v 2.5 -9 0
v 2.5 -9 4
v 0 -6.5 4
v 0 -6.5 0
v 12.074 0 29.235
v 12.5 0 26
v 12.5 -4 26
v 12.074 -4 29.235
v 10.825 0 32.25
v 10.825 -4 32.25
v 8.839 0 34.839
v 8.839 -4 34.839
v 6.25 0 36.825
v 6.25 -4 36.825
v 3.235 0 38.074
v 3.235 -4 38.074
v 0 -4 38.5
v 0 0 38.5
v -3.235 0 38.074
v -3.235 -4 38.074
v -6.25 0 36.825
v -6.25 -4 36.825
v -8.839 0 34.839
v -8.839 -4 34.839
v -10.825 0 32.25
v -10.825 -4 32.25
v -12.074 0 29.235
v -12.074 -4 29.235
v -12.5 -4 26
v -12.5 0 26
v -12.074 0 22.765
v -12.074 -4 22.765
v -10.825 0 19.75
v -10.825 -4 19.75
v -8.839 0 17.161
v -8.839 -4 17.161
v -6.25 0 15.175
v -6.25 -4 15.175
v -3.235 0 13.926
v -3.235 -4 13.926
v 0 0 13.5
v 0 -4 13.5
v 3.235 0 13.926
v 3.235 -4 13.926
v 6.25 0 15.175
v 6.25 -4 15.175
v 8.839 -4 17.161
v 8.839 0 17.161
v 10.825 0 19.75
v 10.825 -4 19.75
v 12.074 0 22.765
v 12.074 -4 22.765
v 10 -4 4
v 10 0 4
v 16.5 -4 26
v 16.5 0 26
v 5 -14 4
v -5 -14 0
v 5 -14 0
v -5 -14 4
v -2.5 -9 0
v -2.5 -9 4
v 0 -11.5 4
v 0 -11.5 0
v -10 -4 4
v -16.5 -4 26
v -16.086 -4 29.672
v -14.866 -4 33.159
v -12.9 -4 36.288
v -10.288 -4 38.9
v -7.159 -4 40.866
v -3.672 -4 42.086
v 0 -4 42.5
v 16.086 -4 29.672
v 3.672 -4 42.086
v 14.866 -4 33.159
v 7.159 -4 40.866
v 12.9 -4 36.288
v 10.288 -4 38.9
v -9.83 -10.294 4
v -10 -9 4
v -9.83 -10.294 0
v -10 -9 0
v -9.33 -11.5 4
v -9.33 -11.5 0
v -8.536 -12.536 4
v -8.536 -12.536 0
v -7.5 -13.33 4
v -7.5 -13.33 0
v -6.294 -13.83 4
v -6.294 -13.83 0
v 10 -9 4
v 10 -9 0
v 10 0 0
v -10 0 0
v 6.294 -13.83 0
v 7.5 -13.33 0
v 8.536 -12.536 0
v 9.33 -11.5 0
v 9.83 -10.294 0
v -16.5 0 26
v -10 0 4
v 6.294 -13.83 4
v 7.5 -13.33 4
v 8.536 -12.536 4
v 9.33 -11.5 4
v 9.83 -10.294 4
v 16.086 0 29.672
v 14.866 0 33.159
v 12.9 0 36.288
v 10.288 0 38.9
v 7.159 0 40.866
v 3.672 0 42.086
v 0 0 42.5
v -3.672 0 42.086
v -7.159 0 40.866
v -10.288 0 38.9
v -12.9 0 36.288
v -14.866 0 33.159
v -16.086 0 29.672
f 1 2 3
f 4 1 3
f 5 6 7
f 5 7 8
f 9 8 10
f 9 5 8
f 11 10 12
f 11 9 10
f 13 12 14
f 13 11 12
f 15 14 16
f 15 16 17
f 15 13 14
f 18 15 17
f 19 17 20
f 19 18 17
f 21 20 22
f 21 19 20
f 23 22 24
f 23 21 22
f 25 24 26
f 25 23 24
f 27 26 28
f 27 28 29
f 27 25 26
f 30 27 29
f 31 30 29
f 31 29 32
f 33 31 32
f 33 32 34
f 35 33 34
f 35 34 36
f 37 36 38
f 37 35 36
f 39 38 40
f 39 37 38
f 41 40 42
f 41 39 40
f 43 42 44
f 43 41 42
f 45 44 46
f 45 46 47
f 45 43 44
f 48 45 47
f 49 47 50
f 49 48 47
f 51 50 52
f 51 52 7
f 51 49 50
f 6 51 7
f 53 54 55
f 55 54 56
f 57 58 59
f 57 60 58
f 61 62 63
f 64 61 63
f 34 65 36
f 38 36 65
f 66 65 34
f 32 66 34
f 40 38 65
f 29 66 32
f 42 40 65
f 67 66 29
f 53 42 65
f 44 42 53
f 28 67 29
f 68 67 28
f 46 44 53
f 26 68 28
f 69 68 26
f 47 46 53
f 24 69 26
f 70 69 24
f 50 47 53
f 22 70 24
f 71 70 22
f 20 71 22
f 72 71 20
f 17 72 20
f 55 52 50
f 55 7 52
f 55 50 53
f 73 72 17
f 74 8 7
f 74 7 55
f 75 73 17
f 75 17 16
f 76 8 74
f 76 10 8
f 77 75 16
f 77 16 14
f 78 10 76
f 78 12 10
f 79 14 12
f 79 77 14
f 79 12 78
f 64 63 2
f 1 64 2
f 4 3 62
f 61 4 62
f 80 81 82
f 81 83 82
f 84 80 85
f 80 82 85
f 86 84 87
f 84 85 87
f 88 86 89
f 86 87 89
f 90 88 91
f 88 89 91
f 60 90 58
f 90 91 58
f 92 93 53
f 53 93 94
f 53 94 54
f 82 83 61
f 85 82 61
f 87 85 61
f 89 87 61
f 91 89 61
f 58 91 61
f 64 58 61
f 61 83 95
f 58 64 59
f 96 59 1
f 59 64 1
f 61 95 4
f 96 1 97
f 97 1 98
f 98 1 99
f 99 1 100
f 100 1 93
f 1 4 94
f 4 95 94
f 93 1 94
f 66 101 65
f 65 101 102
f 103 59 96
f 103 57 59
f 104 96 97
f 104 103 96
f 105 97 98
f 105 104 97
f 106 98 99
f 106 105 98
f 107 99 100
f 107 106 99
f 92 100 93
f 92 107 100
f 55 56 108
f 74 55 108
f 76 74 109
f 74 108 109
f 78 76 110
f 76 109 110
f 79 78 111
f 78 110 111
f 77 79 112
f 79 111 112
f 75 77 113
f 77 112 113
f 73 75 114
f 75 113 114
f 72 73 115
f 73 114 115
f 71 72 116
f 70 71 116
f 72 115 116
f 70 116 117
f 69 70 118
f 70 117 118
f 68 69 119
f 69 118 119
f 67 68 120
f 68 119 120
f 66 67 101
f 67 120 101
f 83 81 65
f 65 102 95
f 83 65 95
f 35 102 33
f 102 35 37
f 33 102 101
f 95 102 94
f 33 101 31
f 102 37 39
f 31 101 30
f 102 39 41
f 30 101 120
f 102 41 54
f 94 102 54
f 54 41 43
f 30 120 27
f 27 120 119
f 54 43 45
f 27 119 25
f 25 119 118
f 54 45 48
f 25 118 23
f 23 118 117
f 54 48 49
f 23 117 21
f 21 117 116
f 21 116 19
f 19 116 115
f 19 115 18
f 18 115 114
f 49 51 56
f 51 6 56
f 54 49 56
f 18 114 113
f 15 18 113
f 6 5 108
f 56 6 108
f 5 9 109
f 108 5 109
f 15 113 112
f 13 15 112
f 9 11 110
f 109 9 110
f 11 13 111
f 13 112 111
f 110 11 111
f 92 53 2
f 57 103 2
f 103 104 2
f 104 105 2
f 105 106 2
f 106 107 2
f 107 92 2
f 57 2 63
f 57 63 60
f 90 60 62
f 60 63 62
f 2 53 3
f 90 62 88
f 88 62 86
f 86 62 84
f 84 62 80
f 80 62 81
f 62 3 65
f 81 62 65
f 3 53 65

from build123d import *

# Parameters (mm, degrees)
F1_DEPTH = 14
F0_R     = 12.5
F2_DEPTH = 4
F3_R     = 5
F5_DEPTH = 4


with BuildPart() as f1:
    # F0 (on Front) → F1 (new body)
    with BuildSketch(Plane.XZ):
        Polygon((-10, 0), (0, 0), (10, 0), (10, 4), (-10, 4), align=None)
    extrude(amount=F1_DEPTH)

    # F0 (on Front) → F2 (join)
    with BuildSketch(Plane.XZ):
        with BuildLine():
            Line((-16.5, 26), (-10, 4))
            Line((-10, 4), (10, 4))
            Line((10, 4), (16.5, 26))
            ThreePointArc((16.5, 26), (0, 42.5), (-16.5, 26))
        make_face()
        with Locations((0, 26)):
            Circle(F0_R, mode=Mode.SUBTRACT)
    extrude(amount=F2_DEPTH)

    # F3
    f3_edges = [f1.edges().sort_by_distance(p)[0] for p in [
        (-10, -14, 2),
        (10, -14, 2),
    ]]
    fillet(f3_edges, radius=F3_R)

    # F4 (on face) → F5 (cut)
    with BuildSketch(Plane.XY.offset(4)):
        Polygon((-2.5, -9), (0, -9), (0, -6.5), align=None)
        Polygon((0, -6.5), (0, -9), (2.5, -9), align=None)
        Polygon((2.5, -9), (0, -9), (0, -11.5), align=None)
        Polygon((0, -11.5), (0, -9), (-2.5, -9), align=None)
    extrude(amount=-F5_DEPTH, mode=Mode.SUBTRACT)


solid = f1.part
